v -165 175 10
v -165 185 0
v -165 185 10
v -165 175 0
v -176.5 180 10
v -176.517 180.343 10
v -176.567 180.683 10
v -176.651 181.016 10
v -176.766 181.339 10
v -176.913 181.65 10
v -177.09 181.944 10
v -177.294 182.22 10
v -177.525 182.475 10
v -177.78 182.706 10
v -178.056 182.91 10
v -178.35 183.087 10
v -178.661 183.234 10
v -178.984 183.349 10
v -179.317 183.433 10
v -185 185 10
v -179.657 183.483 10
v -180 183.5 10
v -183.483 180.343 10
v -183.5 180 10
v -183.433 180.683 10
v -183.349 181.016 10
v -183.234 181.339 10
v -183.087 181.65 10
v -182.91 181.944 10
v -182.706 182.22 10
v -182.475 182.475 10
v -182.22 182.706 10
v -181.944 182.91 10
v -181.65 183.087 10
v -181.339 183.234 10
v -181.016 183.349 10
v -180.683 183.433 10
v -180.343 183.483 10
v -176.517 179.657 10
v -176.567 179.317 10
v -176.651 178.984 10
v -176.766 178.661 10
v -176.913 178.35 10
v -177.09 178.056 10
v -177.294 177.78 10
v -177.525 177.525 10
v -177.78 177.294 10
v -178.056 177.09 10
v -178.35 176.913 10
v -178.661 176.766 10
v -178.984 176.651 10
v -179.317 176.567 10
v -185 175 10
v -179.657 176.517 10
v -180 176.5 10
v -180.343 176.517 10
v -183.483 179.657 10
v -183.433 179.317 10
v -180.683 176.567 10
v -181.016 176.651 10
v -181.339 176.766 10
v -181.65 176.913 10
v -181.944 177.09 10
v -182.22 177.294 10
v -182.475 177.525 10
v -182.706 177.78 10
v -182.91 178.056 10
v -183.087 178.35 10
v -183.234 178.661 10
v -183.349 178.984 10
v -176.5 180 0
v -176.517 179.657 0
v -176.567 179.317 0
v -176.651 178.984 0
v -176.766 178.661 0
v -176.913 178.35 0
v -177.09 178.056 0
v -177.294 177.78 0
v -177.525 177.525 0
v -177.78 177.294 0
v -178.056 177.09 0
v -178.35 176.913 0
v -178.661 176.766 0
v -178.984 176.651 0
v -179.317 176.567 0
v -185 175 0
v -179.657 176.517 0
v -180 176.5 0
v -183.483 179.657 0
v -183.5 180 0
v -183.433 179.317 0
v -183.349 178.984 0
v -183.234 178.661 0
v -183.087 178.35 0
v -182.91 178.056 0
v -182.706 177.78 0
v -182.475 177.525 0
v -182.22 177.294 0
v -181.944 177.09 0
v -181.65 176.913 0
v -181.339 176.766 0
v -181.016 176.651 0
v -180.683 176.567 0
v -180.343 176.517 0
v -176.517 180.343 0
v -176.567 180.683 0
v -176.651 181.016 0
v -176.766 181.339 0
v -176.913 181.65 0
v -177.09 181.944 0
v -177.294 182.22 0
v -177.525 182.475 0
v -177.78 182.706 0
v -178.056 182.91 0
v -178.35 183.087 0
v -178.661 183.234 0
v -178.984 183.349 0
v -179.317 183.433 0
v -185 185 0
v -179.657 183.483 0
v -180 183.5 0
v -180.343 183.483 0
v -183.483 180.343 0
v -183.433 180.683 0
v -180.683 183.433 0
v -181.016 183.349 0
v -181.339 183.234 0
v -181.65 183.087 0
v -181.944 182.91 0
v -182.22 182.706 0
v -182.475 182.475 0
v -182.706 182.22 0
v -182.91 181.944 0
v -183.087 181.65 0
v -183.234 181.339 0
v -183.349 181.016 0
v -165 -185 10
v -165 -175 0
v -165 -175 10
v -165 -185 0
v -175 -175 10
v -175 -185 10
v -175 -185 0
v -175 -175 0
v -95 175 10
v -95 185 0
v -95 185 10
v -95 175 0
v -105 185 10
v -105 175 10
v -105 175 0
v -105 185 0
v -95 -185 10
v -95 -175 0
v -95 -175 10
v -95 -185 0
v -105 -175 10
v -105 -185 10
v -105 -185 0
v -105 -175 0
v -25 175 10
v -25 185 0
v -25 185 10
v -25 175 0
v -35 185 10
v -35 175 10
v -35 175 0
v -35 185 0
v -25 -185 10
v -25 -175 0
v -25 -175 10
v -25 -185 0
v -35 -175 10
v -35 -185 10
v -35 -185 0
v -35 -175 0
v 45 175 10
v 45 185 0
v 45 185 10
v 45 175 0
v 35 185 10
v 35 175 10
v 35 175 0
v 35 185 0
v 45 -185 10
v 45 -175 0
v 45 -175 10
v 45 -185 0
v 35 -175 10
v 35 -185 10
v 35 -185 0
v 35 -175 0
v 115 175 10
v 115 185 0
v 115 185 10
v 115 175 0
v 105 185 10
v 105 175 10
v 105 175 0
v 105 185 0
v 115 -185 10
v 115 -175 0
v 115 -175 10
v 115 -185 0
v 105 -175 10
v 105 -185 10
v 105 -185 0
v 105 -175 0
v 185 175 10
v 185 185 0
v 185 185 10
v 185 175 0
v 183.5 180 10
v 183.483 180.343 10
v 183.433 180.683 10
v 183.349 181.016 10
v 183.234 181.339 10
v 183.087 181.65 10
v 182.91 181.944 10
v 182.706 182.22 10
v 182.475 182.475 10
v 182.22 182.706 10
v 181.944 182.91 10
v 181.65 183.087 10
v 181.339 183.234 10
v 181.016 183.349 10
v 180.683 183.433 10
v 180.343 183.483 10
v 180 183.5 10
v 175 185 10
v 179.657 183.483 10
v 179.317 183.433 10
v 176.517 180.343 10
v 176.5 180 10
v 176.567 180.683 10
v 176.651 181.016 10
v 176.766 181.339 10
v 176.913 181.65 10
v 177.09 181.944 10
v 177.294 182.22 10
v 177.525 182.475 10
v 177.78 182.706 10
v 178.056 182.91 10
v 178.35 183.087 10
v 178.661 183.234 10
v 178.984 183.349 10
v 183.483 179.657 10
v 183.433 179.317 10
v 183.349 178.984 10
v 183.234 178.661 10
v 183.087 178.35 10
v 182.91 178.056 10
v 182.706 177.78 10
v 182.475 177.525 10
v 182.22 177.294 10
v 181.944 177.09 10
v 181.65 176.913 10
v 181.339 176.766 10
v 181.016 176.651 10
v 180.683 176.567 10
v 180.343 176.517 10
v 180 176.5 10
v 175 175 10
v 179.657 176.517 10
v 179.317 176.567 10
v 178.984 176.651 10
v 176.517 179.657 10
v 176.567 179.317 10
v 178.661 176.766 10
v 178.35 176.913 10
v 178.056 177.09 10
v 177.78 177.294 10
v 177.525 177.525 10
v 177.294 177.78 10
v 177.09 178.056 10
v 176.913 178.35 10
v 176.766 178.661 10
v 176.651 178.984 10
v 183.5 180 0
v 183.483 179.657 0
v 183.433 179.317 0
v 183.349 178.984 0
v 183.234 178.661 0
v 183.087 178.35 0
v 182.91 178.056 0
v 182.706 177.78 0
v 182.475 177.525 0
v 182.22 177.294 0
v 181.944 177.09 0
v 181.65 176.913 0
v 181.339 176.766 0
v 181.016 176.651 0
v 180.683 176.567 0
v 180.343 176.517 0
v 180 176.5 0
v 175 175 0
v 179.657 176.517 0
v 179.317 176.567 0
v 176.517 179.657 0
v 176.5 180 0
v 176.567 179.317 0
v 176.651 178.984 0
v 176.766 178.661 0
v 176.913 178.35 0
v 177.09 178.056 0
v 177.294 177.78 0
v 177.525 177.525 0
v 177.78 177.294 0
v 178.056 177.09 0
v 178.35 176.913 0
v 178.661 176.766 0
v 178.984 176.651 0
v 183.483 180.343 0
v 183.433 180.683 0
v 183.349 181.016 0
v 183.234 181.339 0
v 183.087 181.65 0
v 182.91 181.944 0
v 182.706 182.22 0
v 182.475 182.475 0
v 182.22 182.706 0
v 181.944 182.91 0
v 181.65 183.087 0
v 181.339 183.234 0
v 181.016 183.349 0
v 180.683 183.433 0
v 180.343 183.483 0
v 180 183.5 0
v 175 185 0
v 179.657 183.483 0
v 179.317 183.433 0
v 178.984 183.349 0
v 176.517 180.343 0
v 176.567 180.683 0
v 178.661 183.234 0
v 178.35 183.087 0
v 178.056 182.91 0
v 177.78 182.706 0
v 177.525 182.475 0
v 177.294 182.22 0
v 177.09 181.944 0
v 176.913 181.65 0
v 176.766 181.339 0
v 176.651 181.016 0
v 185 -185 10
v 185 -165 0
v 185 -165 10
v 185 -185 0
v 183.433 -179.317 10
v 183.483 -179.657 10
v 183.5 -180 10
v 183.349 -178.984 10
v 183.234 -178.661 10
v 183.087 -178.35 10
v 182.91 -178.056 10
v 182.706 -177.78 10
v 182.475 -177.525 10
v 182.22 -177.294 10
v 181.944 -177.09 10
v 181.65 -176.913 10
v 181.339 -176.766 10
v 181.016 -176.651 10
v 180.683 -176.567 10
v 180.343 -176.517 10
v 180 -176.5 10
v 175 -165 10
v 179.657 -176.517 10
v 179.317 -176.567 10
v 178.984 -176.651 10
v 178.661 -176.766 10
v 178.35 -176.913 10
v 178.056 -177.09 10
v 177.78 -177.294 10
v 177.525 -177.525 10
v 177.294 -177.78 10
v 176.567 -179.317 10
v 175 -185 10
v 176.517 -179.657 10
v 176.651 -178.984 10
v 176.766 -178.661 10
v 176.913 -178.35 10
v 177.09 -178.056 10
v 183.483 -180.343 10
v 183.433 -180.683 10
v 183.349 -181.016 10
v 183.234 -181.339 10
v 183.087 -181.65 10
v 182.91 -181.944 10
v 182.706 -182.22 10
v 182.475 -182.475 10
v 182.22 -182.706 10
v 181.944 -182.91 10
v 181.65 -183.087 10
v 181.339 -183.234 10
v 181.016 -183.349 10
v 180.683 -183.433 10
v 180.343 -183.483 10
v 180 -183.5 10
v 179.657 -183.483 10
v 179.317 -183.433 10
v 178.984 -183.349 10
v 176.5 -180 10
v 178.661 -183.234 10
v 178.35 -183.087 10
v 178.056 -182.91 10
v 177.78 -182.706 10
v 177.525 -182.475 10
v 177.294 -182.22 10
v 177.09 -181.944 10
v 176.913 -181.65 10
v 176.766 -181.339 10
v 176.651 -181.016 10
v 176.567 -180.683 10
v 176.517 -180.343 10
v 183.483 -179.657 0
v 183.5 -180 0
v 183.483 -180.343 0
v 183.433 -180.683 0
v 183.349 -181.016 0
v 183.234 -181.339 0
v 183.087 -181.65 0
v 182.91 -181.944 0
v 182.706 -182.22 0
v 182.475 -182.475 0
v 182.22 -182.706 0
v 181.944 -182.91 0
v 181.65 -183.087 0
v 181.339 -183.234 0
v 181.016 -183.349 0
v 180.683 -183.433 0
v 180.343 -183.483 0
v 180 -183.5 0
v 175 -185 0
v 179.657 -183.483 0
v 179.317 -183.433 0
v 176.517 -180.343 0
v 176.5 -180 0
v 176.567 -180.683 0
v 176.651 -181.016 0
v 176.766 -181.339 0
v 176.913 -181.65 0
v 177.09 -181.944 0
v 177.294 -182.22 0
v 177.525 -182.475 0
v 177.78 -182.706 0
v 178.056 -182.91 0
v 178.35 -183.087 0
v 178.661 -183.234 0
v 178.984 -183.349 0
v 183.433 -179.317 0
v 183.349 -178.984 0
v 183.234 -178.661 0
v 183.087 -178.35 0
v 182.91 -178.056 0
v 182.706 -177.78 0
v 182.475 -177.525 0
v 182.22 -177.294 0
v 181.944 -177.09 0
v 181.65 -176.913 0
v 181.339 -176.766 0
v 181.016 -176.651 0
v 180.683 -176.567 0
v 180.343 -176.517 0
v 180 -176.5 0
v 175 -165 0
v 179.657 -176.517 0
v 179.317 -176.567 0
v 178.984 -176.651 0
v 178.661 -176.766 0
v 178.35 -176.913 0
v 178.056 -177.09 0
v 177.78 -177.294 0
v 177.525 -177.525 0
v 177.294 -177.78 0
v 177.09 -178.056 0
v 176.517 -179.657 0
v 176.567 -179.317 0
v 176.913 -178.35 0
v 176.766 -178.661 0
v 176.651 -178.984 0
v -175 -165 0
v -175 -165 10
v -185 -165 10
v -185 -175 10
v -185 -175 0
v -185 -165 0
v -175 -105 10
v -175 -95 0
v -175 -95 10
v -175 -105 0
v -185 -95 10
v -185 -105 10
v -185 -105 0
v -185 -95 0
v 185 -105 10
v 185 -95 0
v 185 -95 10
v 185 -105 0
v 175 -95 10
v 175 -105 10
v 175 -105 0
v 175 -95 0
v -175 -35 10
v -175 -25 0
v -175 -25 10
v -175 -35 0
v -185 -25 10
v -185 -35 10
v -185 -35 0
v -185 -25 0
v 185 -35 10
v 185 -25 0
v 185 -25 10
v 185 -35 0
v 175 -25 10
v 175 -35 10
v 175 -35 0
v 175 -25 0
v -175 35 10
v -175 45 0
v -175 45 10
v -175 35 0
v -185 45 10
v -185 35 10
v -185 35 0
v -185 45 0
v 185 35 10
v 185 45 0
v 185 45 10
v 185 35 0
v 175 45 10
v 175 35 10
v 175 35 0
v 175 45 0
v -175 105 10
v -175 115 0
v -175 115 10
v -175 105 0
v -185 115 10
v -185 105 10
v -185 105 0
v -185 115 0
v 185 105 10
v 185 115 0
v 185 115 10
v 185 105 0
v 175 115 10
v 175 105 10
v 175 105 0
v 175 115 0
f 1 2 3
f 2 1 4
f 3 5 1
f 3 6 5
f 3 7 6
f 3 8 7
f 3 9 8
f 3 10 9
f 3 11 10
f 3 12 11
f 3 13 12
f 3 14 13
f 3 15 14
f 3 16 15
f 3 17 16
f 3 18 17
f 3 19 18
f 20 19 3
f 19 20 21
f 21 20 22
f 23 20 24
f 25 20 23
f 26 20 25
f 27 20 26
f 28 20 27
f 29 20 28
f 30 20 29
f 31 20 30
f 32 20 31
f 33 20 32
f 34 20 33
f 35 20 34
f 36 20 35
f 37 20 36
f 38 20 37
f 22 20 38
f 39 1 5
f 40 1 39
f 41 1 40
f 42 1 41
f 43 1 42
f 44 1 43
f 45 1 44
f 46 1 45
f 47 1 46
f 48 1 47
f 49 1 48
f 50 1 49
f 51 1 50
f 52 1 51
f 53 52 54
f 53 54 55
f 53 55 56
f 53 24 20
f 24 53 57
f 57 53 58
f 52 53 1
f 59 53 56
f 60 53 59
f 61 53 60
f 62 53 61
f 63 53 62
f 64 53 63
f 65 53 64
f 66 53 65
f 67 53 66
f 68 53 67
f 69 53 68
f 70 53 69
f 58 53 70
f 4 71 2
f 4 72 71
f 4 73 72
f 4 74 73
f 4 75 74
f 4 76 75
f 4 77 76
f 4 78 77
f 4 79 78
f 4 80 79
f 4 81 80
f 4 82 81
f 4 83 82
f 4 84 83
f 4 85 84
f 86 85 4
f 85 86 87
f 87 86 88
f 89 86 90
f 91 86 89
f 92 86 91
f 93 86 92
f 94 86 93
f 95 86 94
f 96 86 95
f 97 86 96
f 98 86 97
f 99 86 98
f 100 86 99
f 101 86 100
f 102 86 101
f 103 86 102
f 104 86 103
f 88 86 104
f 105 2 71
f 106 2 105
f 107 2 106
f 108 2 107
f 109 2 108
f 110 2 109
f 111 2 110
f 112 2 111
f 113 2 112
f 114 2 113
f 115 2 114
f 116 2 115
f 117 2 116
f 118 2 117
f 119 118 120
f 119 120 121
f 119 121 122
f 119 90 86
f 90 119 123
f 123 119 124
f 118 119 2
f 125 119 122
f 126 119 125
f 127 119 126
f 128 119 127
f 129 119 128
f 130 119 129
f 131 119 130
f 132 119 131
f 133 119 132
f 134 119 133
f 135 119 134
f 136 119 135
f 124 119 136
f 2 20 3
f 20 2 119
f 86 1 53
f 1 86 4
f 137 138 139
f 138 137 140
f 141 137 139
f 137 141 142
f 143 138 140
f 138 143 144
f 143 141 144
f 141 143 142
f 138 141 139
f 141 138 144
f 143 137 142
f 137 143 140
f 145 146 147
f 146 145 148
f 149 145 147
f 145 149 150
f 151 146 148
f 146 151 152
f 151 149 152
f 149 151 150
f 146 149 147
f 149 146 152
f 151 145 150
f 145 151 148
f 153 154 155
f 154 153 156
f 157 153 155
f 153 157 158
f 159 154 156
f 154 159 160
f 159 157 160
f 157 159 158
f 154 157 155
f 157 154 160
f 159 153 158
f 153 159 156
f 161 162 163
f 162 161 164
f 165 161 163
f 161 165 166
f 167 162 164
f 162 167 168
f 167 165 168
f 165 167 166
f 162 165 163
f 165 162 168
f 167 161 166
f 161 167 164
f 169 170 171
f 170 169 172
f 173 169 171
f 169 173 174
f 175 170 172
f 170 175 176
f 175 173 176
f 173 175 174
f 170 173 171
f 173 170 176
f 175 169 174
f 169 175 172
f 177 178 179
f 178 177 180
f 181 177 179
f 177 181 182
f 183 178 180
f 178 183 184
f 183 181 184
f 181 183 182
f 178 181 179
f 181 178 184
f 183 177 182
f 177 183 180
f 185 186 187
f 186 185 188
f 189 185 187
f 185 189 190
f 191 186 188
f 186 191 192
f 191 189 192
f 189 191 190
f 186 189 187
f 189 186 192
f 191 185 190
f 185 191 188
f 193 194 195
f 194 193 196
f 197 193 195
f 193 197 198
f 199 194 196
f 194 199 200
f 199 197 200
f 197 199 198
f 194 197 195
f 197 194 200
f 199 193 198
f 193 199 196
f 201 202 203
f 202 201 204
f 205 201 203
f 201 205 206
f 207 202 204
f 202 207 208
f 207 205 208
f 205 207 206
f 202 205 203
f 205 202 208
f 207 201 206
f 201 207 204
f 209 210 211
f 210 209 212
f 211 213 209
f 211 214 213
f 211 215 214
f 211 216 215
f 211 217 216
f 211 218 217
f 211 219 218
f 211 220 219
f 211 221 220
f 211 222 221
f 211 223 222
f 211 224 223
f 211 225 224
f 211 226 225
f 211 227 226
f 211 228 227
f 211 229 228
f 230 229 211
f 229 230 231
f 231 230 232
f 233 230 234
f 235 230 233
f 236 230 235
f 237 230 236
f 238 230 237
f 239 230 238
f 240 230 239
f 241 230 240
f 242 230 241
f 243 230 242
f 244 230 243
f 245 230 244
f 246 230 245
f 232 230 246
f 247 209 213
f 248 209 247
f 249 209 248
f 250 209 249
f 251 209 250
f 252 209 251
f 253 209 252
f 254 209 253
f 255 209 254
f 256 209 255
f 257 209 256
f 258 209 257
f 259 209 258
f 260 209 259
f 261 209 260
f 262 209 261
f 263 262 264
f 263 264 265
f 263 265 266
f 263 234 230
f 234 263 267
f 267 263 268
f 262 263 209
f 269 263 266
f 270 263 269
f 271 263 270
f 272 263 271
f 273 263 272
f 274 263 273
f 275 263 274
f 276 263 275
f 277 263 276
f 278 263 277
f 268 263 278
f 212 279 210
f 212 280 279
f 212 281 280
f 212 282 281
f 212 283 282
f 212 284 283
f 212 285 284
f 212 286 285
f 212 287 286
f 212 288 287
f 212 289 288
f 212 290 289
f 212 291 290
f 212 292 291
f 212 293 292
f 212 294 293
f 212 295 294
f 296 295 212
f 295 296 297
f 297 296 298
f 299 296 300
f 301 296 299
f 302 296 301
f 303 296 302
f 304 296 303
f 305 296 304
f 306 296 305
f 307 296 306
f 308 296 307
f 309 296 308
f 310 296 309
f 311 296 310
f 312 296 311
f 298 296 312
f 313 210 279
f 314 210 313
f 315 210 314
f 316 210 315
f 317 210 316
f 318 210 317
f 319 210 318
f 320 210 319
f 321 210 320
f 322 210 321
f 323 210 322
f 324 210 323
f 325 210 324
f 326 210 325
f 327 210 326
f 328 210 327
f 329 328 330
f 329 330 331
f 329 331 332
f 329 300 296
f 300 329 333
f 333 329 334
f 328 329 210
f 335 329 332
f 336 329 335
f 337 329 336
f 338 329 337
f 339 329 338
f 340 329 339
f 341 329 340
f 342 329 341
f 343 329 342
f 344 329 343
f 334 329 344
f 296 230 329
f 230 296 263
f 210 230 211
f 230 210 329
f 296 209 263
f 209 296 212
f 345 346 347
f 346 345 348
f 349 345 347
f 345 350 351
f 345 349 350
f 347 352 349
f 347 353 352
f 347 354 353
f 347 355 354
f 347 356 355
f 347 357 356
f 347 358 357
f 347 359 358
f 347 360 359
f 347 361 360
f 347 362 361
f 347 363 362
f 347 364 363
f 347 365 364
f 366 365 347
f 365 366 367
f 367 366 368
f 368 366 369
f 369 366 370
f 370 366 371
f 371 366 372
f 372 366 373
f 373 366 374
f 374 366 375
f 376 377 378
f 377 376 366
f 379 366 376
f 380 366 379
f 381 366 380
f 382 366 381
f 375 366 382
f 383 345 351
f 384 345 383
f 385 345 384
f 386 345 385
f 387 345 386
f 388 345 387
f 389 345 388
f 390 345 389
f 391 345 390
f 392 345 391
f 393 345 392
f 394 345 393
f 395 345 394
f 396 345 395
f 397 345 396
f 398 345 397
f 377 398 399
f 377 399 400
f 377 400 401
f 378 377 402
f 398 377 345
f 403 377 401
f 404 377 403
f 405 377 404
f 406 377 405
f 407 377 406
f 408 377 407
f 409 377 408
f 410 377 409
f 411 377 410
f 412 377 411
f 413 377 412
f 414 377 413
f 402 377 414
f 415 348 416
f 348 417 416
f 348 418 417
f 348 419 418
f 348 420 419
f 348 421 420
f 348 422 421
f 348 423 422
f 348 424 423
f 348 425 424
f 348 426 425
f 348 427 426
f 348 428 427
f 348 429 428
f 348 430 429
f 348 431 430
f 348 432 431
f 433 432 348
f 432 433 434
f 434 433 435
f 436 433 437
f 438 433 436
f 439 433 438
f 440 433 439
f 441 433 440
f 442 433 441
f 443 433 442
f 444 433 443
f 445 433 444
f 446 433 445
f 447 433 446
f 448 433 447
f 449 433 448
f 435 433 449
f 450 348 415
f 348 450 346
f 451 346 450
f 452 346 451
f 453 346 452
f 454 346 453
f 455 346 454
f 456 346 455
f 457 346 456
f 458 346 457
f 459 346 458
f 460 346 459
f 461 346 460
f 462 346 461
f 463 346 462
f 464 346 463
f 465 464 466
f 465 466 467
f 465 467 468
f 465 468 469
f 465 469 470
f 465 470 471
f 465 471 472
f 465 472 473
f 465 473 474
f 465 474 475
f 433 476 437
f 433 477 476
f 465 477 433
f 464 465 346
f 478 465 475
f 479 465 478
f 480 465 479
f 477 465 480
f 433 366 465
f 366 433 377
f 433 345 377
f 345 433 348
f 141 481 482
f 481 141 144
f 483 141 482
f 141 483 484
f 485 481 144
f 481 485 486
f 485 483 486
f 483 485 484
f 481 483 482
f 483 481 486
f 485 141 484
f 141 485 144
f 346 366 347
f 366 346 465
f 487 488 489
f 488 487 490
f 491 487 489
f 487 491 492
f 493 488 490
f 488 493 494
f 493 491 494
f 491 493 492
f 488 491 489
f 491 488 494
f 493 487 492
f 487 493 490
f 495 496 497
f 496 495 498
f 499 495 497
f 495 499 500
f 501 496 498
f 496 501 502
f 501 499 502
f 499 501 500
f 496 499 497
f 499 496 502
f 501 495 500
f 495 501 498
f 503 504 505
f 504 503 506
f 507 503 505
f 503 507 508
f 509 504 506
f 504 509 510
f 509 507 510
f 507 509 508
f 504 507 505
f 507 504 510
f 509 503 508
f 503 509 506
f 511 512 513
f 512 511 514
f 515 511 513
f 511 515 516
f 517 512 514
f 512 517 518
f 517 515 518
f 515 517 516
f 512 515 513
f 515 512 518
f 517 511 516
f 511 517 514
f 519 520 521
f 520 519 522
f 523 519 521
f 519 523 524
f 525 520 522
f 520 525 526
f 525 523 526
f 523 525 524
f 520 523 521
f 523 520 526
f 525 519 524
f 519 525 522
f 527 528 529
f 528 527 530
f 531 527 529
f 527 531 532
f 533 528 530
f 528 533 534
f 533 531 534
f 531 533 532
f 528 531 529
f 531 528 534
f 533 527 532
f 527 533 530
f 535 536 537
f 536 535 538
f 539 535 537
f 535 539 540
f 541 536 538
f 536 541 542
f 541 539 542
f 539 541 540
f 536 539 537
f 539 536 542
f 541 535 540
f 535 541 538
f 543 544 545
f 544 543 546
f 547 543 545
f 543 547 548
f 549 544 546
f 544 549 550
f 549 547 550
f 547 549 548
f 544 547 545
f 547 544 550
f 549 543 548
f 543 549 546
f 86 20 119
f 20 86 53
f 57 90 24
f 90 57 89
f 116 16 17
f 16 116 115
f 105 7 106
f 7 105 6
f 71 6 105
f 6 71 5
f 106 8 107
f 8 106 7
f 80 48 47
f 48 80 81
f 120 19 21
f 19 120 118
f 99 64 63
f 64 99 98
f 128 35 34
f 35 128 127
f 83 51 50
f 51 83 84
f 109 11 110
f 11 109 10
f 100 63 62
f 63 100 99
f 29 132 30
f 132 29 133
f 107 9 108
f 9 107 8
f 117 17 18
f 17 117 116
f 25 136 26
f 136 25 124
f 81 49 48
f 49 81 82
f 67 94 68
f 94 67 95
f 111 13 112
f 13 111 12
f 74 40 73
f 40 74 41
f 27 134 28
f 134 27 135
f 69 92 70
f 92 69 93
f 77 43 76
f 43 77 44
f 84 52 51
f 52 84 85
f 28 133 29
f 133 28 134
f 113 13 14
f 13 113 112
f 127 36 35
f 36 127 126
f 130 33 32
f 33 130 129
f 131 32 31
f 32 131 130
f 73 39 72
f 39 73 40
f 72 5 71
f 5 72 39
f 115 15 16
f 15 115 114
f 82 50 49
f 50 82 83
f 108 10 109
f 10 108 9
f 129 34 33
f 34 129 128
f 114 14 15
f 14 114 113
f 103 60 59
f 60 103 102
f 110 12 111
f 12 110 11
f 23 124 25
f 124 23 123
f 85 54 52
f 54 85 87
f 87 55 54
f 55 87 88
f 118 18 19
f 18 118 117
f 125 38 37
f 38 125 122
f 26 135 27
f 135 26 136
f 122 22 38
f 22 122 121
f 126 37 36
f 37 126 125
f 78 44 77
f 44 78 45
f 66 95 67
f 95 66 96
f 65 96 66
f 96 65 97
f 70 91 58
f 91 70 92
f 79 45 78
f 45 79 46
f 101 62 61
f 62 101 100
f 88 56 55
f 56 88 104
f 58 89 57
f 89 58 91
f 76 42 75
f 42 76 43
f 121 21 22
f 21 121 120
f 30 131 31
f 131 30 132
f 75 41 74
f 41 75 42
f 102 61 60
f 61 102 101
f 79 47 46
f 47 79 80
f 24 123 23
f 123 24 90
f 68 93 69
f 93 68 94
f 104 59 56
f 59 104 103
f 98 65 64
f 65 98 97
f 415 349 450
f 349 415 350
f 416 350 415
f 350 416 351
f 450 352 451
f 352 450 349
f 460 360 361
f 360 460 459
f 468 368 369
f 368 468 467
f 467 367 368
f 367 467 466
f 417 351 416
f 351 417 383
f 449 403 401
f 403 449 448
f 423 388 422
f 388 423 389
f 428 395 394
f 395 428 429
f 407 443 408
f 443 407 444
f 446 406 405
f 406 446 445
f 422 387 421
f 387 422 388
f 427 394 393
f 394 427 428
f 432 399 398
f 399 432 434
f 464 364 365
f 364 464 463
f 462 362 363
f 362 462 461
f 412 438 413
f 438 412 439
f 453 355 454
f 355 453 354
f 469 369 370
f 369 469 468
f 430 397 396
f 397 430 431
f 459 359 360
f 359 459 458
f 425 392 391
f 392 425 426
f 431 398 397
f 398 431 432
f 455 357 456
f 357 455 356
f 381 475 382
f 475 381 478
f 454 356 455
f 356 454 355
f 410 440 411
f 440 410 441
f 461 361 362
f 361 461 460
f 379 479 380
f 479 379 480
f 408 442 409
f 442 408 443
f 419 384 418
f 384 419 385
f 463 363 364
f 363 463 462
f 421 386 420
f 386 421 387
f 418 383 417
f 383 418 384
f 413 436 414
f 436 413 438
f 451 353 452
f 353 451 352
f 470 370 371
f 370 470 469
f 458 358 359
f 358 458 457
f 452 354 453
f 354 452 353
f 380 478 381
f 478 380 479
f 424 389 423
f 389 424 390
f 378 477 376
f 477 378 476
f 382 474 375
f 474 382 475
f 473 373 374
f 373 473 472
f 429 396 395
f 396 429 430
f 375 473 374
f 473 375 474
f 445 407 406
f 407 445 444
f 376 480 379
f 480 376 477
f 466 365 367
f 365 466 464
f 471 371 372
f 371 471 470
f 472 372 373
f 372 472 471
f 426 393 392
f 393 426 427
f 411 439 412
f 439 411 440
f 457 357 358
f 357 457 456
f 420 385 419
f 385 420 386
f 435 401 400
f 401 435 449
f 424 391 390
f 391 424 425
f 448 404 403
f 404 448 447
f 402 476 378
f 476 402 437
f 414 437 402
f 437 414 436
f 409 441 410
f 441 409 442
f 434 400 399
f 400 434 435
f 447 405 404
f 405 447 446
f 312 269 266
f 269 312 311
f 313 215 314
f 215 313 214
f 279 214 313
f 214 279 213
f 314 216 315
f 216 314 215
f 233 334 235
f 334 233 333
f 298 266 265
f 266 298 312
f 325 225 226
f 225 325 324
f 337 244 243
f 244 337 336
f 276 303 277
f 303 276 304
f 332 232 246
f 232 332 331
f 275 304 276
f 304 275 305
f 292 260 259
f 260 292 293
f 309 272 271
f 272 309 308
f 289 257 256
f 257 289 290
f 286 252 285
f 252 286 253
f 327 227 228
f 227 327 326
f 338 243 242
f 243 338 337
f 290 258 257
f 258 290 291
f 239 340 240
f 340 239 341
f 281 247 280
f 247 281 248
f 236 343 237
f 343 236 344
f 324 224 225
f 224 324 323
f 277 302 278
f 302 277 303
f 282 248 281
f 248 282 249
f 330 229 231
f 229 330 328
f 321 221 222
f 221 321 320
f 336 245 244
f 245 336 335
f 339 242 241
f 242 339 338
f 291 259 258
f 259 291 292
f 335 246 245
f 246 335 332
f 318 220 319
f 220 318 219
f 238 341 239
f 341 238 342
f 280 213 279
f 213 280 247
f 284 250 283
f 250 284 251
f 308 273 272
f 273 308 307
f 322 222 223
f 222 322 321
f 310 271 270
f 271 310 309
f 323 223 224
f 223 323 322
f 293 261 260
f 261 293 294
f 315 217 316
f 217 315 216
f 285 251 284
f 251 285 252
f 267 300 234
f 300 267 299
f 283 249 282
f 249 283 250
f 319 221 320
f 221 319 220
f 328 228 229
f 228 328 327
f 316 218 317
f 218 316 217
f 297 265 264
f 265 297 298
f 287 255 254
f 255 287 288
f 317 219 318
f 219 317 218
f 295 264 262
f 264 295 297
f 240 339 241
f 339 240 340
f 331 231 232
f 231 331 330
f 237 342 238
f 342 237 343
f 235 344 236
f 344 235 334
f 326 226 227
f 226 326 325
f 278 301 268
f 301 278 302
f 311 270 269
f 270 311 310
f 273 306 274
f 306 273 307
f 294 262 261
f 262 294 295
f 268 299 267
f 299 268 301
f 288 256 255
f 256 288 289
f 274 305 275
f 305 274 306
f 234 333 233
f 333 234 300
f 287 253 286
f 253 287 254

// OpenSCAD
// ring_58.scad - ring index 58 (z bottom = 580 mm)
$fn = 64; bar = 10; half_b = bar/2; outer = 370; half_outer = outer/2;
front_y = 180; back_y = -180; left_x = -180; right_x = 180;
x_centers = [-170, -100, -30, 40, 110, 180];
z_centers = [5, 85, 155, 225, 295, 365, 435, 505, 575, 645, 715]; ring_z = 580;
module place_box(cx, cy, sx, sy) { translate([cx - sx/2, cy - sy/2, 0]) cube([sx, sy, bar]); }

difference() { union() {
    for (x = x_centers) { place_box(x, front_y, bar, bar); place_box(x, back_y, bar, bar); }
    for (y = x_centers) { place_box(left_x, y, bar, bar); place_box(right_x, y, bar, bar); }
    for (zc = z_centers) if ((zc - half_b < ring_z + bar) && (zc + half_b > ring_z)) {
        translate([-half_outer, front_y - half_b, 0]) cube([outer, bar, bar]);
        translate([-half_outer, back_y - half_b, 0])  cube([outer, bar, bar]);
        translate([left_x - half_b, -half_outer, 0])  cube([bar, outer, bar]);
        translate([right_x - half_b, -half_outer, 0]) cube([bar, outer, bar]);
    }
  }
  for (cx = [-180, 180]) for (cy = [-180, 180]) translate([cx, cy, 0]) cylinder(h = bar, r = 3.5, $fn = 64);
}
